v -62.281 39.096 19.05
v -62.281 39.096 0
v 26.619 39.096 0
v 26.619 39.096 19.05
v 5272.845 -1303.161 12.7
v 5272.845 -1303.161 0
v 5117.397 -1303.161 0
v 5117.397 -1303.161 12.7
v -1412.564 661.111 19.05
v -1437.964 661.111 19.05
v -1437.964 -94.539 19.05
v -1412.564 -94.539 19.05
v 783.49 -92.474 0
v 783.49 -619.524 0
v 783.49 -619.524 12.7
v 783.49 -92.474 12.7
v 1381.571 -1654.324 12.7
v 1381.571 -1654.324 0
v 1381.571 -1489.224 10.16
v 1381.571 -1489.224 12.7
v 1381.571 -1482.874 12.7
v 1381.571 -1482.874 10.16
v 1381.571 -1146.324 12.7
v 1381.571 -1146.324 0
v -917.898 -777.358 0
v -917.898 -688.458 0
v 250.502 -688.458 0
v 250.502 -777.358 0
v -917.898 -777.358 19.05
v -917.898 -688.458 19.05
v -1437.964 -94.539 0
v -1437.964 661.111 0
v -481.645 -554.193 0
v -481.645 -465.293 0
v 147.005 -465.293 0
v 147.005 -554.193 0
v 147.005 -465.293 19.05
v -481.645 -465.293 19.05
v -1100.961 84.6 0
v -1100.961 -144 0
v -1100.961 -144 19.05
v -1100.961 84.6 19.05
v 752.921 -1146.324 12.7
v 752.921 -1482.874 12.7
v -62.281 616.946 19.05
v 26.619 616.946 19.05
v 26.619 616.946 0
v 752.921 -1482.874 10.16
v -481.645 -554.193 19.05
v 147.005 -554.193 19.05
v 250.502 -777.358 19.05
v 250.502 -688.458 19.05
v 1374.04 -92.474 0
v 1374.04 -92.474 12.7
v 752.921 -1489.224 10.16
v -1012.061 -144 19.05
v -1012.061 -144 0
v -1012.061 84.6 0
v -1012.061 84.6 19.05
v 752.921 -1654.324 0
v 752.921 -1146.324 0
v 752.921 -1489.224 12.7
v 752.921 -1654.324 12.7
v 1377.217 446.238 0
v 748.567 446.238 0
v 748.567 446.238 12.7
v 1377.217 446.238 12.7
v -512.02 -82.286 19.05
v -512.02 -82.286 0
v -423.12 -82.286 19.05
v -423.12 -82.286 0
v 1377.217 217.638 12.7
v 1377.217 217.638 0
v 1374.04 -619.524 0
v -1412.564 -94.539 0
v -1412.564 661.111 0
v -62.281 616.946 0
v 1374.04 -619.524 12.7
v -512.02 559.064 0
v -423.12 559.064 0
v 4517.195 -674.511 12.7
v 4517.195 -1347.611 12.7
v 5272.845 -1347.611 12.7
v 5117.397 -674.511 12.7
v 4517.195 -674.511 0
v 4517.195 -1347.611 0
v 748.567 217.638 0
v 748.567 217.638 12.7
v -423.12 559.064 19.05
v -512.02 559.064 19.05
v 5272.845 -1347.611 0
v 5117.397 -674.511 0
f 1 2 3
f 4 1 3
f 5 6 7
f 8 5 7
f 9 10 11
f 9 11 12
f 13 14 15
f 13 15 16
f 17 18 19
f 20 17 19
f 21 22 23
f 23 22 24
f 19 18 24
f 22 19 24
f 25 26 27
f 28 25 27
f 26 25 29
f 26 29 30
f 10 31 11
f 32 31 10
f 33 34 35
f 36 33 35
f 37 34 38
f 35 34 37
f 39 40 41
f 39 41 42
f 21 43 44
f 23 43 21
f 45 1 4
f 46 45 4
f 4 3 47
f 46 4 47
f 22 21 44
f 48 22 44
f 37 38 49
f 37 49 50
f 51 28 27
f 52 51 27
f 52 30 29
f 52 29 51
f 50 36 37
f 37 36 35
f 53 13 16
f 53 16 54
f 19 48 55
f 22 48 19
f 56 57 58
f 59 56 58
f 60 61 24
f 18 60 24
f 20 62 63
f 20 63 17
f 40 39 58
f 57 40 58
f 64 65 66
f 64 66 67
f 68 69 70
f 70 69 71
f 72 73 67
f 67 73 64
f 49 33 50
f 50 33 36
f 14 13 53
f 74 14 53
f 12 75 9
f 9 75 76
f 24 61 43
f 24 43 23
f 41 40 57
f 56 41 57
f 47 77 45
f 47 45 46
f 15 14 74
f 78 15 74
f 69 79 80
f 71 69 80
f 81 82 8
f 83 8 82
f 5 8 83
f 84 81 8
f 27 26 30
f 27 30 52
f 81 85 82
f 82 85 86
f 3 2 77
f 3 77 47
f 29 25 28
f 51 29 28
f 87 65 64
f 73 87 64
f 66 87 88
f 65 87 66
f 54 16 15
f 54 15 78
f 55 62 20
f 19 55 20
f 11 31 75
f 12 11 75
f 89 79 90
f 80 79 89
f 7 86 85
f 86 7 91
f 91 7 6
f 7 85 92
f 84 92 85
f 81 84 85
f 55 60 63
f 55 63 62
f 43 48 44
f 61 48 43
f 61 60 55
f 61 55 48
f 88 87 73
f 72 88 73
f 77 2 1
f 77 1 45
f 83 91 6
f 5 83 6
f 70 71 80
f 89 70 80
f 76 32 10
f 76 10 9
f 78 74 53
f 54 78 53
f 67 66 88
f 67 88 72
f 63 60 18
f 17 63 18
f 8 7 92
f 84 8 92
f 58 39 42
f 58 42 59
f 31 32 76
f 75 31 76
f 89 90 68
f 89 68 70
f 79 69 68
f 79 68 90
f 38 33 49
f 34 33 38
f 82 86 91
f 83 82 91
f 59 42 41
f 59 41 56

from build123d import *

# Parameters (mm, degrees)
F0_W     = 88.9
F0_H     = 577.85
F0_W_2   = 628.65
F0_H_2   = 88.9
F0_W_3   = 1168.4
F1_DEPTH = 19.05
F2_W     = 88.9
F2_H     = 641.35
F2_H_2   = 228.6
F2_W_2   = 25.4
F2_H_3   = 755.65
F3_DEPTH = 19.05
F4_W     = 628.65
F4_H     = 228.6
F4_W_2   = 590.55
F4_H_2   = 527.05
F4_H_3   = 508
F5_DEPTH = 12.7
F7_DEPTH = 12.7
F8_W     = 314.325
F8_H     = 6.35
F9_DEPTH = 2.54


with BuildPart() as f1:
    # F0 (on Top) → F1 (new body)
    with BuildSketch(Plane.XY):
        with Locations((-17.83051, 328.020797)):
            Rectangle(F0_W, F0_H)
        with Locations((-167.319894, -509.743035)):
            Rectangle(F0_W_2, F0_H_2)
        with Locations((-333.698159, -732.908174)):
            Rectangle(F0_W_3, F0_H_2)
    extrude(amount=F1_DEPTH)


with BuildPart() as f3:
    # F2 (on Top) → F3 (new body)
    with BuildSketch(Plane.XY):
        with Locations((-467.569783, 238.389238)):
            Rectangle(F2_W, F2_H)
        with Locations((-1056.510612, -29.699606)):
            Rectangle(F2_W, F2_H_2)
        with Locations((-1425.264039, 283.286252)):
            Rectangle(F2_W_2, F2_H_3)
    extrude(amount=F3_DEPTH)


with BuildPart() as f5:
    # F4 (on Top) → F5 (new body)
    with BuildSketch(Plane.XY):
        with Locations((1062.892174, 331.937718)):
            Rectangle(F4_W, F4_H)
        with Locations((1078.765246, -355.999207)):
            Rectangle(F4_W_2, F4_H_2)
        with Locations((1067.245578, -1400.323936)):
            Rectangle(F4_W, F4_H_3)
    extrude(amount=F5_DEPTH)

    # F8 (on face) → F9 (cut)
    with BuildSketch(Plane.XY.offset(12.7)):
        with Locations((910.083078, -1486.048936)):
            Rectangle(F8_W, F8_H)
        with Locations((1224.408078, -1486.048936)):
            Rectangle(F8_W, F8_H)
    extrude(amount=-F9_DEPTH, mode=Mode.SUBTRACT)


with BuildPart() as f7:
    # F6 (on Top) → F7 (new body)
    with BuildSketch(Plane.XY):
        Polygon((5117.397308, -674.510831), (4517.195308, -674.510831), (4517.195308, -1347.610831), (5117.397308, -1347.610831), (5272.845308, -1347.610831), (5272.845308, -1303.160831), (5117.397308, -1303.160831), align=None)
    extrude(amount=F7_DEPTH)


solid = Compound([f1.part, f3.part, f5.part, f7.part])
